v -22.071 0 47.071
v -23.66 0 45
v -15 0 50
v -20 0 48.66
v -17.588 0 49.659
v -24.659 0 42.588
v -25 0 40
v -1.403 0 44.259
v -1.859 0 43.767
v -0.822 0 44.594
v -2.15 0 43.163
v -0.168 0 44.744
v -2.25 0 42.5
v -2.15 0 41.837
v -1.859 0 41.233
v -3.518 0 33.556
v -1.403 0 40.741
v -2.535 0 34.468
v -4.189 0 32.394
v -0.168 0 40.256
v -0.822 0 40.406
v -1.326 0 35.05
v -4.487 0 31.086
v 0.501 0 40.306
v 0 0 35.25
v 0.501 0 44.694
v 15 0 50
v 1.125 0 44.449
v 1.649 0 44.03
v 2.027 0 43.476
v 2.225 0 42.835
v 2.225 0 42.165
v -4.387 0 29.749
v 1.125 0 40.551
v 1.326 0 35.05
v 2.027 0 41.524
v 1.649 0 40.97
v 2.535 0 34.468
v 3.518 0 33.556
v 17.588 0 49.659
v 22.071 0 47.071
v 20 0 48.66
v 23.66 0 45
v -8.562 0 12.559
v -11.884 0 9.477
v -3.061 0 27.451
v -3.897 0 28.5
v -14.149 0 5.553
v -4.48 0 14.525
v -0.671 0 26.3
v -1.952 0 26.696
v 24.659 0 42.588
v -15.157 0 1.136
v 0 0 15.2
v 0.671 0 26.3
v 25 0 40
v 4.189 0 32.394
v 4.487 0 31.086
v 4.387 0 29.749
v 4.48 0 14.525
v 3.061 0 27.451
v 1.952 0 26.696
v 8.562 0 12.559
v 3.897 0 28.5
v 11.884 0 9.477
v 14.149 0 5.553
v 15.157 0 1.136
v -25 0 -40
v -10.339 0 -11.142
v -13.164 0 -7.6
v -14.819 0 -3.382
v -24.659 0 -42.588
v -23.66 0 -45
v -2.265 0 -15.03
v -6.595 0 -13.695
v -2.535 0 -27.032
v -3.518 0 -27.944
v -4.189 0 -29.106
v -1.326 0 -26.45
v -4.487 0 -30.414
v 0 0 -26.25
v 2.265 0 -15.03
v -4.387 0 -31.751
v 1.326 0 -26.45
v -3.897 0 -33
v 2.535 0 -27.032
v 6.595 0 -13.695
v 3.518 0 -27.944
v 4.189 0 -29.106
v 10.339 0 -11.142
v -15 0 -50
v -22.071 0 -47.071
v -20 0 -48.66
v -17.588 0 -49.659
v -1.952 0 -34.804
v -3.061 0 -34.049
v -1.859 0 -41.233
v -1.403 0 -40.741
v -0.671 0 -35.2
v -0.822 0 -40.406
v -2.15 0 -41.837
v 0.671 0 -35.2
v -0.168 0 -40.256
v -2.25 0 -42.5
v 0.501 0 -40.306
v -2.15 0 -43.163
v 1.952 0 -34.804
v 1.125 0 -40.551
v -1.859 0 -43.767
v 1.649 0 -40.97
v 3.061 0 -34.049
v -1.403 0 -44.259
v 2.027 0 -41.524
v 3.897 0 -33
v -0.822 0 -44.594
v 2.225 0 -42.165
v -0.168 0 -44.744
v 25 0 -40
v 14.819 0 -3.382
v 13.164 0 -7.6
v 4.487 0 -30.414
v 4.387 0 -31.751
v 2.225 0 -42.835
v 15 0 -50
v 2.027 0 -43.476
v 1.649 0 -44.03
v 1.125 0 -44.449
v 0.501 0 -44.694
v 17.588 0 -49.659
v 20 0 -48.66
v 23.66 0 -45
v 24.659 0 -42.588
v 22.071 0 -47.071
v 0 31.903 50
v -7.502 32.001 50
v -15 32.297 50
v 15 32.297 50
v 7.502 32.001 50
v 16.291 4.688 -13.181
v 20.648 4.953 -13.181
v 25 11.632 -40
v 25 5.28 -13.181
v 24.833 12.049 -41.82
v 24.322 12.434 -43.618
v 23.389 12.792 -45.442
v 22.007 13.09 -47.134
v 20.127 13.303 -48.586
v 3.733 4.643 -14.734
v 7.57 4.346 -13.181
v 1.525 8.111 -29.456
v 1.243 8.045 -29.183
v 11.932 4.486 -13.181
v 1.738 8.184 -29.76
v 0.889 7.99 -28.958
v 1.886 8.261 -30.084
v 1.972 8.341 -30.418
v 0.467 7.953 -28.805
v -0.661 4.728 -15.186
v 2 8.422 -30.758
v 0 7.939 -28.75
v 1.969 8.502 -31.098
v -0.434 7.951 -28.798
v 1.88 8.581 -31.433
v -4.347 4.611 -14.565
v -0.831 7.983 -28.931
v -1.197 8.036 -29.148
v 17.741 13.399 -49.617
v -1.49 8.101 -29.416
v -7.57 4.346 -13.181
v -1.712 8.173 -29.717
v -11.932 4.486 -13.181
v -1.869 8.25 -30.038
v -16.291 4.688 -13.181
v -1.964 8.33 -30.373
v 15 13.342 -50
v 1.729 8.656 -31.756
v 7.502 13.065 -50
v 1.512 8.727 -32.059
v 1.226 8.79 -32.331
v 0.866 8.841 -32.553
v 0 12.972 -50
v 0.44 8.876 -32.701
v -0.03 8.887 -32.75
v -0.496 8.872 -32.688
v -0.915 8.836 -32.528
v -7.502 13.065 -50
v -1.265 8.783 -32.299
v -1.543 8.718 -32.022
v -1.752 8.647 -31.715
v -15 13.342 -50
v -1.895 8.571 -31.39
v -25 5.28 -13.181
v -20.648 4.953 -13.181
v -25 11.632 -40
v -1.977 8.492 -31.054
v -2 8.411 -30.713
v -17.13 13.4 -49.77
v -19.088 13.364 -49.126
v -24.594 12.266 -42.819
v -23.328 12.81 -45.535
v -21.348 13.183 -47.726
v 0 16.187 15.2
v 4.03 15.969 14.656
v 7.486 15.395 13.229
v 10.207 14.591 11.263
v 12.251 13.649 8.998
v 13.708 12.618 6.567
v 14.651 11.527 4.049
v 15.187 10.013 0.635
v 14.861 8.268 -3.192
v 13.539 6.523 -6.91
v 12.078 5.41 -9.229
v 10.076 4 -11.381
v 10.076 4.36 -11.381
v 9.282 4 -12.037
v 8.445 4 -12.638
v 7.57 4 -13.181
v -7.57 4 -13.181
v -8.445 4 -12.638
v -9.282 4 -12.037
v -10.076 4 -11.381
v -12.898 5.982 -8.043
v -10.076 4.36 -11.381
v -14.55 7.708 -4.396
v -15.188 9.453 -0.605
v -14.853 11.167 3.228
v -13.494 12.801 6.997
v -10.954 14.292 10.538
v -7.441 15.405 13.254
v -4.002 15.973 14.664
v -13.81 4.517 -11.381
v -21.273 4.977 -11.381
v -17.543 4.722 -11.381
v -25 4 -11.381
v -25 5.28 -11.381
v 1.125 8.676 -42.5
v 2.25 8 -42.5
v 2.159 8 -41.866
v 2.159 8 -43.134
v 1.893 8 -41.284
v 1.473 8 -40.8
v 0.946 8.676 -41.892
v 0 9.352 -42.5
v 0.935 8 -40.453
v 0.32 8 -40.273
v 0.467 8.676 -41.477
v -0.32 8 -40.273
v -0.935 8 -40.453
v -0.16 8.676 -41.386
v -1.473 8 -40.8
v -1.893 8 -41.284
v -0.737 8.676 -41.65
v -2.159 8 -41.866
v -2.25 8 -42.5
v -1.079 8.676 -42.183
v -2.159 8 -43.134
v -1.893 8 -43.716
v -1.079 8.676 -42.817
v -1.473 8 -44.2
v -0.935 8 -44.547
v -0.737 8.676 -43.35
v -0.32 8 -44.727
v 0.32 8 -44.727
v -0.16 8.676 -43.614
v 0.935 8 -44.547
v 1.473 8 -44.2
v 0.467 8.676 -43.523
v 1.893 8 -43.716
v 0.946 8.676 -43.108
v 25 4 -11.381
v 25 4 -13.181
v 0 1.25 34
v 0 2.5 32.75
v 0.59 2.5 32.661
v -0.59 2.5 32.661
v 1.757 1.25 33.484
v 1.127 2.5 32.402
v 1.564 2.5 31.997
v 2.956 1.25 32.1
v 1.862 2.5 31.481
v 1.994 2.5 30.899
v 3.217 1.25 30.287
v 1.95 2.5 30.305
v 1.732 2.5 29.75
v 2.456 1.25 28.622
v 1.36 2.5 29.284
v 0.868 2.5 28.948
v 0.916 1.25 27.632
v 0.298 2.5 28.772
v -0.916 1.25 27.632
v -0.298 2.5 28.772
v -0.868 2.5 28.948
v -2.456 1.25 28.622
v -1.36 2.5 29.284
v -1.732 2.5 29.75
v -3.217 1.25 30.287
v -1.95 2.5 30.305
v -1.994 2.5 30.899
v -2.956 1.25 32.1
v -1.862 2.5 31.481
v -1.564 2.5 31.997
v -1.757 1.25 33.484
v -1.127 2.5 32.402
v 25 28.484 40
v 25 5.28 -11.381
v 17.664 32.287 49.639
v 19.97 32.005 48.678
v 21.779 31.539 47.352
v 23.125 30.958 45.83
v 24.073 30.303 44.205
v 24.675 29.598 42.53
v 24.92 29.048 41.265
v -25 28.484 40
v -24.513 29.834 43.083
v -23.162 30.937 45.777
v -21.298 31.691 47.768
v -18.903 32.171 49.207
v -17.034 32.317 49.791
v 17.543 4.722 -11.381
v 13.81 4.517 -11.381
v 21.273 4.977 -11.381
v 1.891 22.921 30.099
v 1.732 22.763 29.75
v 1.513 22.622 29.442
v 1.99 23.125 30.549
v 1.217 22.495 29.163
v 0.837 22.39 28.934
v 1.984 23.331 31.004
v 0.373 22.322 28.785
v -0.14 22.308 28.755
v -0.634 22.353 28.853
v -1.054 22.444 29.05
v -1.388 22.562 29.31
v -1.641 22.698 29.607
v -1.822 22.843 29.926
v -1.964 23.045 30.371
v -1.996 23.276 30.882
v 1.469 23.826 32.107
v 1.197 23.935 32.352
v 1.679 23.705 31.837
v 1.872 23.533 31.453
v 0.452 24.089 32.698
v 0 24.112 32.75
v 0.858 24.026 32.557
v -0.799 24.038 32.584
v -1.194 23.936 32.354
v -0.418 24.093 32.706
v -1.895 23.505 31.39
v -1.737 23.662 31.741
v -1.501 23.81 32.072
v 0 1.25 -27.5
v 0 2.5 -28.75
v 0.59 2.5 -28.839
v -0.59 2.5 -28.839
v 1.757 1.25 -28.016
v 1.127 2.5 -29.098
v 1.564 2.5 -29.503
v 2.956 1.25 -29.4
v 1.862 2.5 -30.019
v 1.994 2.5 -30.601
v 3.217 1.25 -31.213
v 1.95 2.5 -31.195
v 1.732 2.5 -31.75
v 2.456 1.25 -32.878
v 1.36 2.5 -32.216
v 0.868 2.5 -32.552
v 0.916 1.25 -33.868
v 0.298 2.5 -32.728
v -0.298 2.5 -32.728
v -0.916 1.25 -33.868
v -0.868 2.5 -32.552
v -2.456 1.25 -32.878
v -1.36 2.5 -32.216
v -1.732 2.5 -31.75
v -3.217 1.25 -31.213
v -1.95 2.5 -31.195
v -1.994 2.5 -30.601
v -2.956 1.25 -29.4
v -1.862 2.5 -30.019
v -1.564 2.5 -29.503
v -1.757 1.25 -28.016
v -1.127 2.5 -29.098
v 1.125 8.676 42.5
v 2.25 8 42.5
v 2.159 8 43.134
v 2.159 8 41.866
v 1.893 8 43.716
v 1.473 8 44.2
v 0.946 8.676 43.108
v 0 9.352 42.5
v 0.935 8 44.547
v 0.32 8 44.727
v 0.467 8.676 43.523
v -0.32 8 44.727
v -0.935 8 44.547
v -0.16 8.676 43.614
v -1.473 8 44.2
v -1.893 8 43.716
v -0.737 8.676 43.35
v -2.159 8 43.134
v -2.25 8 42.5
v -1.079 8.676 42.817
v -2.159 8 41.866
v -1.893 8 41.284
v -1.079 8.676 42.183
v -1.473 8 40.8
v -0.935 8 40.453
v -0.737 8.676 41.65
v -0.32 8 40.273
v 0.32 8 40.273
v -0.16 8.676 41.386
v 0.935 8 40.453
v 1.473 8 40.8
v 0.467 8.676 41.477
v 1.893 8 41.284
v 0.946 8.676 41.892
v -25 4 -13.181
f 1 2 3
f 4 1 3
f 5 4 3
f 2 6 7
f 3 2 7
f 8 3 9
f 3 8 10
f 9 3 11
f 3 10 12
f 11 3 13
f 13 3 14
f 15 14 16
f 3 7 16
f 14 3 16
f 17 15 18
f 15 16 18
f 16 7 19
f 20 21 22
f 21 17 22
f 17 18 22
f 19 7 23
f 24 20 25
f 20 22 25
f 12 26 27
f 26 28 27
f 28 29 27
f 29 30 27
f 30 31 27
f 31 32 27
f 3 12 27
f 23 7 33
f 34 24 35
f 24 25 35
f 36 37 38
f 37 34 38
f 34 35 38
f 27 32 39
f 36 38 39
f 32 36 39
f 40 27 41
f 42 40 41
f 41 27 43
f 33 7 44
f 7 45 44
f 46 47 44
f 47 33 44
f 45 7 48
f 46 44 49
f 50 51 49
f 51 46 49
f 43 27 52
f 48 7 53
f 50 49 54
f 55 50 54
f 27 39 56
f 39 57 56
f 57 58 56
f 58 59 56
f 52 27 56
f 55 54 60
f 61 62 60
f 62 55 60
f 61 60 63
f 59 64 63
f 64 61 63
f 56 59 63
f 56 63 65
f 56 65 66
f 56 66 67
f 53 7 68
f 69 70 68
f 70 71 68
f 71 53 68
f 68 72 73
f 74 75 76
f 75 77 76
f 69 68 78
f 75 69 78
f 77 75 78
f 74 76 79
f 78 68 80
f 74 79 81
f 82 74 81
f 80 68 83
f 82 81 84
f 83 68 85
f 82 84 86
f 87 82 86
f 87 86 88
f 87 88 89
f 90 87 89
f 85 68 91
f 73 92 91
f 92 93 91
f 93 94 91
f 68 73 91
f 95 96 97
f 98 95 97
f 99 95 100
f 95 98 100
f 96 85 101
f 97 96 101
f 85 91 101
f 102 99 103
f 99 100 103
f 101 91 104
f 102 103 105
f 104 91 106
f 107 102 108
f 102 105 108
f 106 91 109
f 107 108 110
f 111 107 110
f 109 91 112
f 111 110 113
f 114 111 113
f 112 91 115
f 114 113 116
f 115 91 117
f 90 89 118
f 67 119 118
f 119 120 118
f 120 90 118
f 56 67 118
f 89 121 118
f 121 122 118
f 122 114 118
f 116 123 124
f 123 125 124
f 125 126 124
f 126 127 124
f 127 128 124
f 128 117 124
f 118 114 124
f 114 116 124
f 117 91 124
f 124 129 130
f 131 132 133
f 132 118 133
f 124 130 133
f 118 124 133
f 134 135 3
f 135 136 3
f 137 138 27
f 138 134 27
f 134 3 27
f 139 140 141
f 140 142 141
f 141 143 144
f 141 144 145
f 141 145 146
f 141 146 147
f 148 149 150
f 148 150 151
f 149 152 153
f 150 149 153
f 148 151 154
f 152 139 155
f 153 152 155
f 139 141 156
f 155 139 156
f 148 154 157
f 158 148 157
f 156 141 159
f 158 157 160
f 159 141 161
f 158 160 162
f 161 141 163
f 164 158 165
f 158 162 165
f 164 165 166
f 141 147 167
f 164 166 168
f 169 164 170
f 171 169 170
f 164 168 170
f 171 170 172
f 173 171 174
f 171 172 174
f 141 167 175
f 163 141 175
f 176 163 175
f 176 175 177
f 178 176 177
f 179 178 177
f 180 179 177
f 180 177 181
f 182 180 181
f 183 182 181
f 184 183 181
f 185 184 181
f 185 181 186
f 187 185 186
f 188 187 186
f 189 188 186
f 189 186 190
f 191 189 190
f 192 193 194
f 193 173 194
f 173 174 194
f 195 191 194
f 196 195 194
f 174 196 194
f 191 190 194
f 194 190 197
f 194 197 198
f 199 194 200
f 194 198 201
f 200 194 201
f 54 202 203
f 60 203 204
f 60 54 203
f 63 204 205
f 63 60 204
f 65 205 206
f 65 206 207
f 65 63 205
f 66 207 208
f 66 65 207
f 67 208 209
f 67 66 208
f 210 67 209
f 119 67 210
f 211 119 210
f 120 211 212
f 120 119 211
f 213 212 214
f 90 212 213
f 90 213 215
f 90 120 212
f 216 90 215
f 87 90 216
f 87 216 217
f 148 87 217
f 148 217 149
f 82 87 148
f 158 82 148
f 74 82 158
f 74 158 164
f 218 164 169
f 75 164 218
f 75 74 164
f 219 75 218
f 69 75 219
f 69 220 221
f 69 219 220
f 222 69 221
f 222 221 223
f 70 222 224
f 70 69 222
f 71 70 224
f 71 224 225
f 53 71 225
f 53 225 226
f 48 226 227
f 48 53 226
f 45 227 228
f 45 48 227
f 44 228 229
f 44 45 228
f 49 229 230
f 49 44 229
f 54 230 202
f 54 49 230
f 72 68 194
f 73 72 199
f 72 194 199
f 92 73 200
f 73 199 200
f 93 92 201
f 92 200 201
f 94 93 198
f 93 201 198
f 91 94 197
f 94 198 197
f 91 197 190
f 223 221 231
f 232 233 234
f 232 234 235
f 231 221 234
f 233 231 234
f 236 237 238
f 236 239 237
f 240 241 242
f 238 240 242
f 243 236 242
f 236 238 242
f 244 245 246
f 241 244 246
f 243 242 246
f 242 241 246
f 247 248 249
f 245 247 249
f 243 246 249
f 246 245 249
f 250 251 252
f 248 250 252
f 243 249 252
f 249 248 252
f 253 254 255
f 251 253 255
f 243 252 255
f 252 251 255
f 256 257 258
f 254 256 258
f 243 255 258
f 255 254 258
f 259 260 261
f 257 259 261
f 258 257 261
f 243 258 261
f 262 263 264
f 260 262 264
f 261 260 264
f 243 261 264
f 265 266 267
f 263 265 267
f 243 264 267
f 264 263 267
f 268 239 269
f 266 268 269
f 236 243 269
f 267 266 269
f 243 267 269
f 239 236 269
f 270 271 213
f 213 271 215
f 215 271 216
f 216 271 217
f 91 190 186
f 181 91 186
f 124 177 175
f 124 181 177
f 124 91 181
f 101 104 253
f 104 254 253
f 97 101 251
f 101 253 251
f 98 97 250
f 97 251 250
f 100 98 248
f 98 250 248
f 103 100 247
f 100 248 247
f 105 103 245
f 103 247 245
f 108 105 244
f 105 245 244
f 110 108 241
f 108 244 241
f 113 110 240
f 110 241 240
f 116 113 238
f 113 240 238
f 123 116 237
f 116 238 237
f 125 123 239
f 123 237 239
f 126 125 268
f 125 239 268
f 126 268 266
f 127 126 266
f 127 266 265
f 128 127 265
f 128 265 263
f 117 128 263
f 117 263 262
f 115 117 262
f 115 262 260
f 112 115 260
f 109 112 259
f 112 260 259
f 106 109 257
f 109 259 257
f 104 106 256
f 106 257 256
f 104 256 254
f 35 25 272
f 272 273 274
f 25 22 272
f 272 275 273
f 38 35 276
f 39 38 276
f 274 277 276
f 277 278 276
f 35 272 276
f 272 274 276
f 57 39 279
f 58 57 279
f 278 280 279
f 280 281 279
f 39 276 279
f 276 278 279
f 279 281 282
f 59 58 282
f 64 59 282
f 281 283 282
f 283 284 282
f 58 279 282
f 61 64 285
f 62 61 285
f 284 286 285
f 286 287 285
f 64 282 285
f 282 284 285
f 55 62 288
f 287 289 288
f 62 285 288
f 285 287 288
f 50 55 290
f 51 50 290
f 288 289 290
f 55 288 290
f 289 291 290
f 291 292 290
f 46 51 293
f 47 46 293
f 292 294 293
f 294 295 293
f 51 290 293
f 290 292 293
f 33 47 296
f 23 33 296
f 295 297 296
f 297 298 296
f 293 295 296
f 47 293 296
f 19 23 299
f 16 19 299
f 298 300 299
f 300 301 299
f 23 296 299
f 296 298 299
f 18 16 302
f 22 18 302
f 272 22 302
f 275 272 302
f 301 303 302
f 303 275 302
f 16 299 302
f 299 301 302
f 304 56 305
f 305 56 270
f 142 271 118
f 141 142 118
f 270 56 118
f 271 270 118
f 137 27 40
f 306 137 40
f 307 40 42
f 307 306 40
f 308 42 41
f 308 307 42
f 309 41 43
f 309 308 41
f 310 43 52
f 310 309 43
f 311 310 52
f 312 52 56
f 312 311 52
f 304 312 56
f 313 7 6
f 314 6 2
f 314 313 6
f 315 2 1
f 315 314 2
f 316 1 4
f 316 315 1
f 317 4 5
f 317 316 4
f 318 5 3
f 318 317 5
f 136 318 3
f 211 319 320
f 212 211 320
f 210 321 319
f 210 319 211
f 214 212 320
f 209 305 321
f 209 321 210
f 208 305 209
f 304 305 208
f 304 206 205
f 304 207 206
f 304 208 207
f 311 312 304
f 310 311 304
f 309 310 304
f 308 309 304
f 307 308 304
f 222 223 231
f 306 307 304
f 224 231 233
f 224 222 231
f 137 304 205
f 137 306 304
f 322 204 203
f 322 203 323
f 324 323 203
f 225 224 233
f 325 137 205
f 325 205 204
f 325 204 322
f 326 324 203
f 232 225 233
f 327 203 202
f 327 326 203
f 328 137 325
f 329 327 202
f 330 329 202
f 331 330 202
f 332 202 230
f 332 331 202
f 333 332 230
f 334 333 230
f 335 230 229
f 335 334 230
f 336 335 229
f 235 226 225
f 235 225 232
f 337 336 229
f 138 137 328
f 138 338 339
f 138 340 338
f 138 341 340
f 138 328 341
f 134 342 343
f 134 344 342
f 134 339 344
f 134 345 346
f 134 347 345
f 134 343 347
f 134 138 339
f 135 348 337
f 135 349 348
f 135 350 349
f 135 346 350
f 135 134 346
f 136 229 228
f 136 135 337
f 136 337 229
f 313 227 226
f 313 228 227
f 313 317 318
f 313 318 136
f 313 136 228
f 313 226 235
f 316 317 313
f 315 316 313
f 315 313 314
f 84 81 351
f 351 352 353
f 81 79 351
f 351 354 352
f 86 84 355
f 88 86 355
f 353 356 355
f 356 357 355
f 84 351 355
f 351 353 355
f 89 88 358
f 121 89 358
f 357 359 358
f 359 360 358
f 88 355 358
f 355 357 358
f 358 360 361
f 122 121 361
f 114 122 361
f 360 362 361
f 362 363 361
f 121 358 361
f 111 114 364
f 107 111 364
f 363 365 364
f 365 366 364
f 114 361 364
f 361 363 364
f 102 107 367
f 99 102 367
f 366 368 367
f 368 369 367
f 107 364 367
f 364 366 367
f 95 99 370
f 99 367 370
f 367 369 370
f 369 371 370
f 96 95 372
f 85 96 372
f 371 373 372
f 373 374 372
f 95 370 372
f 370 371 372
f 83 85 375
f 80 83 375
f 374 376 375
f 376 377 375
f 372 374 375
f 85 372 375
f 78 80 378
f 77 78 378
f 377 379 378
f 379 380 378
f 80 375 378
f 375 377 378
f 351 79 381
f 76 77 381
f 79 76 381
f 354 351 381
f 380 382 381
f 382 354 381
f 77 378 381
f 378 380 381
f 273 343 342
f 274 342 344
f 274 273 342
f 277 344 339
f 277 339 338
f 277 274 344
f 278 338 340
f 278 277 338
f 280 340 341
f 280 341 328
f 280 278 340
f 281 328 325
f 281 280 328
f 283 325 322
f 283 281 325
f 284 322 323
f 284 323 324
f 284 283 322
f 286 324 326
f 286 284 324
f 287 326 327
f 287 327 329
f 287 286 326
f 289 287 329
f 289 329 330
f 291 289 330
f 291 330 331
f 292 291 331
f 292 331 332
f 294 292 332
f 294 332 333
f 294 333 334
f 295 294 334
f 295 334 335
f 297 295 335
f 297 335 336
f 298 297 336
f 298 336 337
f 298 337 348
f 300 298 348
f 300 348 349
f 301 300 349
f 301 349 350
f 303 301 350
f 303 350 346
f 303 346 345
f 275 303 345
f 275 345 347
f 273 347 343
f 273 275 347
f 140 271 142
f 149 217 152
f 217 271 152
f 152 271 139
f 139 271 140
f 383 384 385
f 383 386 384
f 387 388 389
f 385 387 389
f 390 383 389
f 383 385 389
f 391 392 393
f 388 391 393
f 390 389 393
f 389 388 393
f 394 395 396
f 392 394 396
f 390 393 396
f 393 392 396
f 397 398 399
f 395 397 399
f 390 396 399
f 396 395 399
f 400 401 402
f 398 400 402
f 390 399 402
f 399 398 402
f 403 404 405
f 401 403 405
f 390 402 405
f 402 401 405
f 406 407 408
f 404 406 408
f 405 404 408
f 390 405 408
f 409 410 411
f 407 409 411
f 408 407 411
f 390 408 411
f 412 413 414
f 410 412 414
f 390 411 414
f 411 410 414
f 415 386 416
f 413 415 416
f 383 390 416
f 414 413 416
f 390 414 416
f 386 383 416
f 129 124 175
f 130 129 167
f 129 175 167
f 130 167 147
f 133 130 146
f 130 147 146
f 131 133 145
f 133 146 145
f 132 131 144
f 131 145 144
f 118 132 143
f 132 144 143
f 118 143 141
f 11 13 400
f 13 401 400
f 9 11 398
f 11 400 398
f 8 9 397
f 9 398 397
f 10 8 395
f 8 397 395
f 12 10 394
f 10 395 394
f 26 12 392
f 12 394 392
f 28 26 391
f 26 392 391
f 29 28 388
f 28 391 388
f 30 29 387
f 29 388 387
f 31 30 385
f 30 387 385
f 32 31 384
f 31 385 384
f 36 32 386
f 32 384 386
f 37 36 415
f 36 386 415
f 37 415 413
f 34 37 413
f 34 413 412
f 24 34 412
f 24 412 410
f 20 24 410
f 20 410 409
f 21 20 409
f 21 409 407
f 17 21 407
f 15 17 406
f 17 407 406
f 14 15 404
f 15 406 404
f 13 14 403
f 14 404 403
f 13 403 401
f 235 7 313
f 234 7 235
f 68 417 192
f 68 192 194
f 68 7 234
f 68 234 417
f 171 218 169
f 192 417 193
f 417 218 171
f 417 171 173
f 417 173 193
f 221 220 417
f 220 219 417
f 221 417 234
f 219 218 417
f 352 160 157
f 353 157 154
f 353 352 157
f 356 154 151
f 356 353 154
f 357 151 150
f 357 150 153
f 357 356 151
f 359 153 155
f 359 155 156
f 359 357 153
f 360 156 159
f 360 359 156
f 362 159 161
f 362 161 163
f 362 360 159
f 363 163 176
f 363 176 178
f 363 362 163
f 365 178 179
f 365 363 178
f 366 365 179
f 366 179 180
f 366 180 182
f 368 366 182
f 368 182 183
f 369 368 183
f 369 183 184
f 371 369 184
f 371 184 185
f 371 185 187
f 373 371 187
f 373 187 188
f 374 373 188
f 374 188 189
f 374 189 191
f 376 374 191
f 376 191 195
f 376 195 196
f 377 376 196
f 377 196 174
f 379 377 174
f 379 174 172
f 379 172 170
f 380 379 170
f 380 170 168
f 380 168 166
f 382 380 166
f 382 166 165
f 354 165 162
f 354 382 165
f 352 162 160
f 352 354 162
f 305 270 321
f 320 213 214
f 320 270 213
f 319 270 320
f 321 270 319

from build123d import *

# Parameters (mm, degrees)
SKETCH1_W                      = 50
SKETCH1_H                      = 100
SKETCH1_R                      = 15.2
SKETCH1_R_2                    = 2
BOSS_EXTRUDE1_DEPTH            = 33
CUT_EXTRUDE1_DEPTH             = 79.0320447
CHAMFER1_SIZE                  = 2.5
CUT_EXTRUDE2_DEPTH             = 68.029405
CUT_EXTRUDE4_DEPTH             = 39.051248
SKETCH6_W                      = 1.8
SKETCH6_H                      = 1.279654747
CUT_EXTRUDE5_DEPTH             = 79.03204487
FILLET1_R                      = 10
F_4_5_4_5_DIAMETER_HOLE1_D     = 4.5
F_4_5_4_5_DIAMETER_HOLE1_DEPTH = 8
F_4_5_4_5_DIAMETER_HOLE1_TIP   = 1.351936393


with BuildPart() as part:
    # Sketch1 → Boss-Extrude1 (new body)
    with BuildSketch(Plane(origin=(0, 0, 0), x_dir=(1, 0, 0), z_dir=(0, 1, 0))):
        Rectangle(SKETCH1_W, SKETCH1_H)
        with Locations(Location((0, 0, 0), (0, 0, 270))):
            Circle(SKETCH1_R, mode=Mode.SUBTRACT)
        with Locations(Location((0, 30.75, 0), (0, 0, 270))):
            Circle(SKETCH1_R_2, mode=Mode.SUBTRACT)
        with Locations(Location((0, -30.75, 0), (0, 0, 270))):
            Circle(SKETCH1_R_2, mode=Mode.SUBTRACT)
    extrude(amount=BOSS_EXTRUDE1_DEPTH)

    # Sketch2 → Cut-Extrude1 (cut, through all)
    with BuildSketch(Plane(origin=(25, 0, 0), x_dir=(0, 0, -1), z_dir=(1, 0, 0))):
        Polygon((50, 14), (12, 5), (-50, 33), (50, 33), align=None)
    extrude(amount=-CUT_EXTRUDE1_DEPTH, mode=Mode.SUBTRACT)

    # Chamfer1
    chamfer1_edges = [part.edges().sort_by_distance(p)[0] for p in [
        (0, 0, -32.75),
        (0, 0, 28.75),
    ]]
    chamfer(chamfer1_edges, length=CHAMFER1_SIZE)

    # Sketch3 → Cut-Extrude2 (cut)
    with BuildSketch(Plane(origin=(0, 24.345721694, 53.908383751), x_dir=(-1, 0, 0), z_dir=(0, -0.4115867224264983, -0.9113705996586748))):
        with BuildLine():
            Line((25, 9.495893667), (-25, 9.495893667))
            ThreePointArc((-25, 9.495893667), (0, 8.495893667), (25, 9.495893667))
        make_face()
    extrude(amount=CUT_EXTRUDE2_DEPTH, mode=Mode.SUBTRACT)

    # Sketch4 → Cut-Extrude4 (cut)
    with BuildSketch(Plane(origin=(0, 11.956721311, -50.483934426), x_dir=(-1, 0, 0), z_dir=(0, 0.23046638387921348, -0.9730802874900093))):
        with BuildLine():
            Line((25, 2.099804831), (-25, 2.099804831))
            ThreePointArc((-25, 2.099804831), (0, 1.099804831), (25, 2.099804831))
        make_face()
    extrude(amount=-CUT_EXTRUDE4_DEPTH, mode=Mode.SUBTRACT)

    # Sketch6 → Cut-Extrude5 (cut, through all)
    with BuildSketch(Plane.ZY.offset(25)):
        with Locations((-12.280764488, 4.639827374)):
            Rectangle(SKETCH6_W, SKETCH6_H)
    extrude(amount=-CUT_EXTRUDE5_DEPTH, mode=Mode.SUBTRACT)

    # Fillet1
    fillet1_edges = [part.edges().sort_by_distance(p)[0] for p in [
        (25, 16.5, 50),
        (25, 7, -50),
        (-25, 7, -50),
        (-25, 16.5, 50),
    ]]
    fillet(fillet1_edges, radius=FILLET1_R)

    # Ø4.5 (4.5) Diameter Hole1
    with Locations(Plane.XZ):
        with Locations((0, 42.5), (0, -42.5)):
            Hole(F_4_5_4_5_DIAMETER_HOLE1_D / 2, depth=F_4_5_4_5_DIAMETER_HOLE1_DEPTH)
            with Locations((0, 0, -(F_4_5_4_5_DIAMETER_HOLE1_DEPTH + F_4_5_4_5_DIAMETER_HOLE1_TIP / 2))):  # 118° drill point
                Cone(0, F_4_5_4_5_DIAMETER_HOLE1_D / 2, F_4_5_4_5_DIAMETER_HOLE1_TIP, mode=Mode.SUBTRACT)


solid = part.part
